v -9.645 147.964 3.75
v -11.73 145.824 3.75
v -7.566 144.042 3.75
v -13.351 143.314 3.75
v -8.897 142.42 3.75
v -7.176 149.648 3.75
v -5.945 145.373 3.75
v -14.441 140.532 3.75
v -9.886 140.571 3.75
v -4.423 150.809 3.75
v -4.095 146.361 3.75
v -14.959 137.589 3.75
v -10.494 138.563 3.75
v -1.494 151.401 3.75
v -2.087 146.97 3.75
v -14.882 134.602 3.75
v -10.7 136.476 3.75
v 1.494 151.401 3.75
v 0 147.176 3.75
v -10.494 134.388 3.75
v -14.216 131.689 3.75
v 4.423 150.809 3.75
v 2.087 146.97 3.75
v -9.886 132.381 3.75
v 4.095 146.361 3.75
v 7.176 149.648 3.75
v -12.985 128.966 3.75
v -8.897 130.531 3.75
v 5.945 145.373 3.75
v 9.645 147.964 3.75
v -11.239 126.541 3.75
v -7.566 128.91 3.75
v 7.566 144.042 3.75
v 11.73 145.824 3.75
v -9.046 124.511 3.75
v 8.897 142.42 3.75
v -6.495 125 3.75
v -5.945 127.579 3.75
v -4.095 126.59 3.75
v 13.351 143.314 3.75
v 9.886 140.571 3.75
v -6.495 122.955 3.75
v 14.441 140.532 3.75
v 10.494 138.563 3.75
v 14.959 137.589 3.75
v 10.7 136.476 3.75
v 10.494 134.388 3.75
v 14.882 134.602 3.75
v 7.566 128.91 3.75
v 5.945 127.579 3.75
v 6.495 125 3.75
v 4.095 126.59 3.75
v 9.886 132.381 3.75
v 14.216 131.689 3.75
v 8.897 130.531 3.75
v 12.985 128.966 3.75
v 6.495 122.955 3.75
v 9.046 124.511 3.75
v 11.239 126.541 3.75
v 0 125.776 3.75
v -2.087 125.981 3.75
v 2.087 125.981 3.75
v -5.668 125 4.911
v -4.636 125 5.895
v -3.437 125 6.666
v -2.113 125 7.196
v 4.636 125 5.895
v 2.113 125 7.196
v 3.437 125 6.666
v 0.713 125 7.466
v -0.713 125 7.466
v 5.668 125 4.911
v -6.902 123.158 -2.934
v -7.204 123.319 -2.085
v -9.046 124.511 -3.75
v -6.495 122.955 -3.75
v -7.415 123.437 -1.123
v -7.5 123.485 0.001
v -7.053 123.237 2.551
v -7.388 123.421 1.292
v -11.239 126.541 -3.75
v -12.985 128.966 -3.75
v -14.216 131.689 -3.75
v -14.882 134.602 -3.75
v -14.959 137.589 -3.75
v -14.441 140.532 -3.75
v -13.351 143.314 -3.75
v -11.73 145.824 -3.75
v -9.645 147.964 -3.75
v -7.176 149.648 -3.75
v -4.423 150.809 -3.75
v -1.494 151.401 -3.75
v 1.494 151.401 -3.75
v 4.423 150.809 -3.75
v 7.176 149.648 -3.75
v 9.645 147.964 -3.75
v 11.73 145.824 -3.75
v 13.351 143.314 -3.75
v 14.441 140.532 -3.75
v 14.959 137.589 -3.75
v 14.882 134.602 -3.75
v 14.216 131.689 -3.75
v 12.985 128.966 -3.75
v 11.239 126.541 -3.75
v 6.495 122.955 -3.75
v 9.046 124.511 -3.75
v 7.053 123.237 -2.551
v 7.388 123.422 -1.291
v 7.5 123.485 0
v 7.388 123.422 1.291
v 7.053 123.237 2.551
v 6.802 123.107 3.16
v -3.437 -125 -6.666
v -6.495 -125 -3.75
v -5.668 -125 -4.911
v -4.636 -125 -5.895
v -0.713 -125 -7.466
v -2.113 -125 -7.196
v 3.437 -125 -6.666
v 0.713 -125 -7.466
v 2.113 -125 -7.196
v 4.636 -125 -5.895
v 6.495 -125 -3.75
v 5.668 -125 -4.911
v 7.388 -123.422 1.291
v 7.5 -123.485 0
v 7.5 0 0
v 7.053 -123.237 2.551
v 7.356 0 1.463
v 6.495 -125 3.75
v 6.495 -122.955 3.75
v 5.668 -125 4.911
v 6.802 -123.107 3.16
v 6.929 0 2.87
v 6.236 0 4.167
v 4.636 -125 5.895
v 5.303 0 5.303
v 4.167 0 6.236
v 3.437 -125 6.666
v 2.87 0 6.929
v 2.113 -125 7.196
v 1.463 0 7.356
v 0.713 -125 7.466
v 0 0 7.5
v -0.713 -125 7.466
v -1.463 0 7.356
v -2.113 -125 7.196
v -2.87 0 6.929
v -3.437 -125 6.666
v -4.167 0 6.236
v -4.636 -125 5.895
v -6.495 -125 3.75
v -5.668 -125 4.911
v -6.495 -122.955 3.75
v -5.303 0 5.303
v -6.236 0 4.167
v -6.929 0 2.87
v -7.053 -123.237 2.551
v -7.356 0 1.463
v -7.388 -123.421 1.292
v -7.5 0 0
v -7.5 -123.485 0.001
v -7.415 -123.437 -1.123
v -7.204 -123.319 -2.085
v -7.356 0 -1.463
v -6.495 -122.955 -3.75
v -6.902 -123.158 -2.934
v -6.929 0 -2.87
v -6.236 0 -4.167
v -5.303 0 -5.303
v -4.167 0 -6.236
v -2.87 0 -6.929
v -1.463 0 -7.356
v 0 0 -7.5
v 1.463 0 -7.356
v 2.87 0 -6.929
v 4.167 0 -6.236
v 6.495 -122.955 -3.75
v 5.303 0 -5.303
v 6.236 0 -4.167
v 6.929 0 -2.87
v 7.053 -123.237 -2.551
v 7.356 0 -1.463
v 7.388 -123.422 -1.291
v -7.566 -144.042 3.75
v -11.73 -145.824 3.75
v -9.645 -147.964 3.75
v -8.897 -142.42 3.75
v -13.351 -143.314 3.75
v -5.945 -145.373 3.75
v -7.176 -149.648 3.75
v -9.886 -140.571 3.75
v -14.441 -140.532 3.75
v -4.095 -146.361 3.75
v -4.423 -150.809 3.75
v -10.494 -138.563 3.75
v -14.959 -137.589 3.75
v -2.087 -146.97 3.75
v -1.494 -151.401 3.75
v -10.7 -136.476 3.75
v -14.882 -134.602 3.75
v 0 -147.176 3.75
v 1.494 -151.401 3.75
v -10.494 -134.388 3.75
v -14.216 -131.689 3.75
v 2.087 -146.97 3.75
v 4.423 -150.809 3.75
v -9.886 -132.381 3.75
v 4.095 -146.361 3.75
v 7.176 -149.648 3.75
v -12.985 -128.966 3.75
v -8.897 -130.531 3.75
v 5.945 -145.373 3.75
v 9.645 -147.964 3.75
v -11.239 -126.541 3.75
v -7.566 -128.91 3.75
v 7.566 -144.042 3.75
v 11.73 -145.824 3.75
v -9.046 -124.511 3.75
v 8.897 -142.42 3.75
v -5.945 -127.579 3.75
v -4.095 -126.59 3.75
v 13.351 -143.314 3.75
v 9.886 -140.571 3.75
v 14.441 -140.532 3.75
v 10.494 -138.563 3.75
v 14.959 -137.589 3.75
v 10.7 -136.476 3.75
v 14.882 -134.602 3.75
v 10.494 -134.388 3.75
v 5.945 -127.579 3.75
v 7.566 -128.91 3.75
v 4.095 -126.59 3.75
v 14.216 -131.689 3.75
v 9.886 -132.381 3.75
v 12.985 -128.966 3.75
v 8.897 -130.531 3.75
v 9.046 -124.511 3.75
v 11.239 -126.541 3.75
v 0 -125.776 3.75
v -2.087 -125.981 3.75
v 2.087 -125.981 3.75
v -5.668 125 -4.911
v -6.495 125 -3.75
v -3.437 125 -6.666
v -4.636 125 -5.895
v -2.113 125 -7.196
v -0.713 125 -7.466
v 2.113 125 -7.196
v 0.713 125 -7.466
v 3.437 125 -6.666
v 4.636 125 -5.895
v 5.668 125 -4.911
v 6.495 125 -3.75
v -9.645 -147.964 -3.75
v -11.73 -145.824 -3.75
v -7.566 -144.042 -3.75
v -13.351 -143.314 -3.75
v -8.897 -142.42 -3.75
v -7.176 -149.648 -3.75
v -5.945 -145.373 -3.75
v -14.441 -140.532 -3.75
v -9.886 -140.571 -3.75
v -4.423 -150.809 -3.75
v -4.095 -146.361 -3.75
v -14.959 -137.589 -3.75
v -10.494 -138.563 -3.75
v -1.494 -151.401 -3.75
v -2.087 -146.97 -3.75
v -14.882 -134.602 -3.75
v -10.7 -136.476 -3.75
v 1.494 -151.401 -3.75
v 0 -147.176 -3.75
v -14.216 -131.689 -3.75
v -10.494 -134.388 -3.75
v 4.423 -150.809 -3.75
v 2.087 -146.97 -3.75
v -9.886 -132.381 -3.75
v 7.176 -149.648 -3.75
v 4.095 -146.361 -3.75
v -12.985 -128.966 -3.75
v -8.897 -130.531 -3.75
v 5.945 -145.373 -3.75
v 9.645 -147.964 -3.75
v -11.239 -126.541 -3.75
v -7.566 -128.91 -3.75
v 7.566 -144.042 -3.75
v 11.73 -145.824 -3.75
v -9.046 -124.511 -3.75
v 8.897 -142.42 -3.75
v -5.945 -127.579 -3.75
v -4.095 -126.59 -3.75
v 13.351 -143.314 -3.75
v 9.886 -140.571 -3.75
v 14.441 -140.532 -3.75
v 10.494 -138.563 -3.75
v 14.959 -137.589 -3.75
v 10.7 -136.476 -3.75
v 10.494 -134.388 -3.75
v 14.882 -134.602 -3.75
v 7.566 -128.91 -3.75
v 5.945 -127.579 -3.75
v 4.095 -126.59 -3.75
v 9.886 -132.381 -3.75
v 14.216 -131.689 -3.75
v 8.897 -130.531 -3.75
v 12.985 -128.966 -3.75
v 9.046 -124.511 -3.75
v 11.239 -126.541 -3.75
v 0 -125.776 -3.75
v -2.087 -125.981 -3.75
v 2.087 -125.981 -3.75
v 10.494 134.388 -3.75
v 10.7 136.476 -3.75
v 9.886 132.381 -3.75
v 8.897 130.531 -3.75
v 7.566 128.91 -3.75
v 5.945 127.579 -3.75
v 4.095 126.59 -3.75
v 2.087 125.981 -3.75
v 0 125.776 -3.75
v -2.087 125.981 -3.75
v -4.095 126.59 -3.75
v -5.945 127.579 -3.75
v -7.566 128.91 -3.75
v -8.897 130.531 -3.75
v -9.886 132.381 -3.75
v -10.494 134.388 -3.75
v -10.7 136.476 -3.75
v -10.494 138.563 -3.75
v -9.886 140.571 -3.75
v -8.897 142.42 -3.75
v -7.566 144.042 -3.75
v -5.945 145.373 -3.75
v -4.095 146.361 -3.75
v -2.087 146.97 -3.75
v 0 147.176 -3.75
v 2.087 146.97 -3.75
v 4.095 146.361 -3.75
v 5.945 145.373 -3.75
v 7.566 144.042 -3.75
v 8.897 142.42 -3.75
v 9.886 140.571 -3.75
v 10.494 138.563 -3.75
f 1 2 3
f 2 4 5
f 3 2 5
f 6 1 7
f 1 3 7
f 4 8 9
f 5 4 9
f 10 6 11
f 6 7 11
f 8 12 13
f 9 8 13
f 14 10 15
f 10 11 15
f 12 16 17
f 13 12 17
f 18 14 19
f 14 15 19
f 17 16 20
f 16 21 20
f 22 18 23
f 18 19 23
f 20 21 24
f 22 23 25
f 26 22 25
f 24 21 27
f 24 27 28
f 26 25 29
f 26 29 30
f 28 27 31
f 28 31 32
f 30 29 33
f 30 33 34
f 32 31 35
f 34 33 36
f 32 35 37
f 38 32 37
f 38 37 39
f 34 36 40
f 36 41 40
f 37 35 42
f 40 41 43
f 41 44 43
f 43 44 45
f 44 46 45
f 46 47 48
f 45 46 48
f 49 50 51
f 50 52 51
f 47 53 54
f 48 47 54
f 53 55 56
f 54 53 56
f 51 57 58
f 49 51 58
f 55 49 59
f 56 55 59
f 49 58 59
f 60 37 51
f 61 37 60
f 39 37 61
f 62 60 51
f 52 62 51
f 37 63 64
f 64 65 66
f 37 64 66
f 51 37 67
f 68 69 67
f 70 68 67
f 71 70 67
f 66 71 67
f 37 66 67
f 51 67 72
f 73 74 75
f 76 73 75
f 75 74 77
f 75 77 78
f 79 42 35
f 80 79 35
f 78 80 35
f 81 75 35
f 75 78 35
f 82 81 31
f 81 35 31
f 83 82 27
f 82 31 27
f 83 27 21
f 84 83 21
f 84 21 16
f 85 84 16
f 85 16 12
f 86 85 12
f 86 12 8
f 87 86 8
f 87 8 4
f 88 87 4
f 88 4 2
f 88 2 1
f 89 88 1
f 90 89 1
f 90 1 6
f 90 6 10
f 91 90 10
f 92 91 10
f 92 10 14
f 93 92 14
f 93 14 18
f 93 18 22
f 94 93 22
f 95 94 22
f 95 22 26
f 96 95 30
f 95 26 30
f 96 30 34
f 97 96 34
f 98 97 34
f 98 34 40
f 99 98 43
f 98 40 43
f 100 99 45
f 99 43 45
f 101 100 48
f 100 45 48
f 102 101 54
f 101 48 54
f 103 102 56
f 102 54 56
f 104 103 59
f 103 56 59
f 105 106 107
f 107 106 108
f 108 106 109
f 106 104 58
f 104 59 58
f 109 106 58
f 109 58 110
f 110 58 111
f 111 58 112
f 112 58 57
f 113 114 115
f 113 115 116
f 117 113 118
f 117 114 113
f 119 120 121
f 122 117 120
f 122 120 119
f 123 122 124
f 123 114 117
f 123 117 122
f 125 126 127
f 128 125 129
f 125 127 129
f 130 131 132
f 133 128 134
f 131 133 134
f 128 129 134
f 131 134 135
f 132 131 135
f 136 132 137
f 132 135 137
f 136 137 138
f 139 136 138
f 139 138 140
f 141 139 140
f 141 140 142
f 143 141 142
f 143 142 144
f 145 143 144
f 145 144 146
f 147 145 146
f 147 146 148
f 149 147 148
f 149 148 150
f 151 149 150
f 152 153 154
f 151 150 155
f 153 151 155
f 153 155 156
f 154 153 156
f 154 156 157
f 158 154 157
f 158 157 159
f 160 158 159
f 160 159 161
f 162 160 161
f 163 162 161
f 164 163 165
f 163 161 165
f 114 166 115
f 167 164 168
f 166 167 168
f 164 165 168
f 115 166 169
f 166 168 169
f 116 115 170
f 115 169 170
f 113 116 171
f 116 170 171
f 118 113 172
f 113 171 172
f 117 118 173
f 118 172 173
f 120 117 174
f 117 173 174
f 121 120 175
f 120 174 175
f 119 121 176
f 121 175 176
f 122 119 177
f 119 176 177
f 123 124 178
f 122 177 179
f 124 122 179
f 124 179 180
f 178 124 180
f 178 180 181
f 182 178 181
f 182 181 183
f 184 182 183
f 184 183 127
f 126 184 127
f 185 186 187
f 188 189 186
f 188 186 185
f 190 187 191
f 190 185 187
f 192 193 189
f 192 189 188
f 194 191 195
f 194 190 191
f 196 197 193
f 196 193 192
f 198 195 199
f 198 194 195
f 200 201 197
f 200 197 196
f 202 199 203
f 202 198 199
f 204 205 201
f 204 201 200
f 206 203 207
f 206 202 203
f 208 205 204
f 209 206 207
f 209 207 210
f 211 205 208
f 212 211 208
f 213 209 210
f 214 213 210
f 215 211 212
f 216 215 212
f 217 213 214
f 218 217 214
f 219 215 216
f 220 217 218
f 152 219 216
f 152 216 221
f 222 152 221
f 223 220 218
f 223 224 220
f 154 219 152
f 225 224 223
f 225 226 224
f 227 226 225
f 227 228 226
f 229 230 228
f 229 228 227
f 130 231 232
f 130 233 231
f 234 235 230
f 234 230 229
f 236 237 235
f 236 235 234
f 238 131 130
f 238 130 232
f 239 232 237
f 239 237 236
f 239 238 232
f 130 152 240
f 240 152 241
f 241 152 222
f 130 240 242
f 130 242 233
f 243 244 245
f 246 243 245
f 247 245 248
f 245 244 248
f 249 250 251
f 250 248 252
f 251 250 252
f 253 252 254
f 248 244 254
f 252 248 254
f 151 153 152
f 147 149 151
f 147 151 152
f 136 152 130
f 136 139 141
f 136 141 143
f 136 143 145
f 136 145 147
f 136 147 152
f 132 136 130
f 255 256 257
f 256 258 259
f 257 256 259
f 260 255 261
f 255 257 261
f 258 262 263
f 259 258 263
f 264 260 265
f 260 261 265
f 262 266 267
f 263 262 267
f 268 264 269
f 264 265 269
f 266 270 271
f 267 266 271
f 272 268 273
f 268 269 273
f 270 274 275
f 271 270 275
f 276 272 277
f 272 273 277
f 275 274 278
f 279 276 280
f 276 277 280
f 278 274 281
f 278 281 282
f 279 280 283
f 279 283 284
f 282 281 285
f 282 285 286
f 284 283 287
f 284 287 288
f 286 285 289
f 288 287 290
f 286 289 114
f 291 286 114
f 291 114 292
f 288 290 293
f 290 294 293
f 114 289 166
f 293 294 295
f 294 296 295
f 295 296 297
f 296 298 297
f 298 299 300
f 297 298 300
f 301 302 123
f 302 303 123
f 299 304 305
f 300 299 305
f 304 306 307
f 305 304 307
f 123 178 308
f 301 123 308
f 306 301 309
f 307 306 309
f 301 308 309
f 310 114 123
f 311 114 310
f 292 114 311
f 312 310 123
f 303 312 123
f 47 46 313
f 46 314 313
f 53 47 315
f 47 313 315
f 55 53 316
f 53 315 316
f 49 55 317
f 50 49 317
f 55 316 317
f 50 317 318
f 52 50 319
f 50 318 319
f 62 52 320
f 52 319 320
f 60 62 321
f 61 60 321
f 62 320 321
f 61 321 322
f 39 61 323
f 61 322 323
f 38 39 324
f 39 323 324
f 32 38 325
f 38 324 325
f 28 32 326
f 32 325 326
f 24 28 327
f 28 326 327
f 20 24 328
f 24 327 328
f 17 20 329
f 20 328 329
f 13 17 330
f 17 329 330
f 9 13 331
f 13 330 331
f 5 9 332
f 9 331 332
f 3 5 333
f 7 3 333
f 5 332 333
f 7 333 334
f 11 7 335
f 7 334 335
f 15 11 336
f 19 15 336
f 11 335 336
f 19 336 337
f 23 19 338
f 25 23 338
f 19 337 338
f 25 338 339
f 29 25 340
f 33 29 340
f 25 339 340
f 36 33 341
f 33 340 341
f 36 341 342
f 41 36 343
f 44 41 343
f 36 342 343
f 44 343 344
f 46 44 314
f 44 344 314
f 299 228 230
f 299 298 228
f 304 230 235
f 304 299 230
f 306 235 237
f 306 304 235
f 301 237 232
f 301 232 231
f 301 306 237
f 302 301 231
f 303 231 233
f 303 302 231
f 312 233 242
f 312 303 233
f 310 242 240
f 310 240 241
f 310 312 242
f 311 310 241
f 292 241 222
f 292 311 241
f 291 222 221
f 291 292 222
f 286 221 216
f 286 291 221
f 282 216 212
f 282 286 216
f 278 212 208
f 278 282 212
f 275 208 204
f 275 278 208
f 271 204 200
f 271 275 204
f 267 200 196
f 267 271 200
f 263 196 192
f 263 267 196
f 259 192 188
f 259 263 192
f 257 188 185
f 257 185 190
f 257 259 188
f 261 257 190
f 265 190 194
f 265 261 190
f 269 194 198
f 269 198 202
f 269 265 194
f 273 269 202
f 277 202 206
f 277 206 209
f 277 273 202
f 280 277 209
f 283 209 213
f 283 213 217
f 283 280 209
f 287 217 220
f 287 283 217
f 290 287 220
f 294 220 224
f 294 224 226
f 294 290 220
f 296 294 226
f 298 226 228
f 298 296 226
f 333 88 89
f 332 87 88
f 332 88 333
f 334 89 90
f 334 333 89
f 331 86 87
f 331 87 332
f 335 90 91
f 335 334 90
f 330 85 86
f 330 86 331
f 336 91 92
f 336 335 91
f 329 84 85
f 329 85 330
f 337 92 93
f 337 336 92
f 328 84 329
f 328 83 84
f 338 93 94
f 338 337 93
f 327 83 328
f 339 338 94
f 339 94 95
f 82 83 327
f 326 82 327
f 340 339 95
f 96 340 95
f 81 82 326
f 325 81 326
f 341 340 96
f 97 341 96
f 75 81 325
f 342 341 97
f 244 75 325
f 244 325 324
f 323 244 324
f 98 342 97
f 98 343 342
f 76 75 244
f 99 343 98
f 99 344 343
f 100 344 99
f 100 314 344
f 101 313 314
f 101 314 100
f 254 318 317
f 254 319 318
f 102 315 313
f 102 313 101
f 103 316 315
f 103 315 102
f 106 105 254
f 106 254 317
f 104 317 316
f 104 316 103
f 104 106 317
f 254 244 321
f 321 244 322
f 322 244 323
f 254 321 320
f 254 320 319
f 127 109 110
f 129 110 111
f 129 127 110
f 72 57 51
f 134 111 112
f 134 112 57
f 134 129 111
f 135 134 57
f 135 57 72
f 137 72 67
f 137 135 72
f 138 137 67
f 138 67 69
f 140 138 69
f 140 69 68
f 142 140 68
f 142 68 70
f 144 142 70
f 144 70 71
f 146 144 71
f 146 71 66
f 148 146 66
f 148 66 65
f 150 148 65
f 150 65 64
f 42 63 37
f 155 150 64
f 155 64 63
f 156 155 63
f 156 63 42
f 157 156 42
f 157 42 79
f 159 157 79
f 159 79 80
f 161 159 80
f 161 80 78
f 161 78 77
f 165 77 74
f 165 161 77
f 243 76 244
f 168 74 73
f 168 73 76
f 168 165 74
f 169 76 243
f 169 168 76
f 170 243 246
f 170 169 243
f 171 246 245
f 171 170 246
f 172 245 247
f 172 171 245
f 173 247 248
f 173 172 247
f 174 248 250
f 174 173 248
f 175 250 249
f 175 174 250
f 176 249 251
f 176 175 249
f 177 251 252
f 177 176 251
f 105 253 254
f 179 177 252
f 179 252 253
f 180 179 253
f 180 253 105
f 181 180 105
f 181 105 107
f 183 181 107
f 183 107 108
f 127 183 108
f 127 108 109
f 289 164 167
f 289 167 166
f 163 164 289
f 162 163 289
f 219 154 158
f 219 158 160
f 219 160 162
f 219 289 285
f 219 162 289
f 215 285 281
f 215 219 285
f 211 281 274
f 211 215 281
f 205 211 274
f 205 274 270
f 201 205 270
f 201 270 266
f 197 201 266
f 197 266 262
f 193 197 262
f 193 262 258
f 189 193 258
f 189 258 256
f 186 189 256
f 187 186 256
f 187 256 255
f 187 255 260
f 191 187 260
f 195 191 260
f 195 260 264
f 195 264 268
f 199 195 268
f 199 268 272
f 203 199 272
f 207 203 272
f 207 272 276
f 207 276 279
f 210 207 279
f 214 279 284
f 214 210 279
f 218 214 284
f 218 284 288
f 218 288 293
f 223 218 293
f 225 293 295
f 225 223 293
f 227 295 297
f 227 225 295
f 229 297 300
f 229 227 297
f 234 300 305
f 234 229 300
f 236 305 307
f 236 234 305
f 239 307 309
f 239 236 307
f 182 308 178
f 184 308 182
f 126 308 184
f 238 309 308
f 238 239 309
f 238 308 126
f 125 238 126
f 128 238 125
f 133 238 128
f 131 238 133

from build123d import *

# Parameters (mm, degrees)
F0_R     = 7.5
F1_DEPTH = 125
F2_R     = 15
F2_R_2   = 10.7
F3_DEPTH = 3.75


with BuildPart() as f1:
    # F0 (on Front) → F1 (new body)
    with BuildSketch(Plane.XZ):
        Circle(F0_R)
    extrude(amount=F1_DEPTH)

    # F2 (on Top) → F3 (join, symmetric)
    with BuildSketch(Plane.XY):
        with Locations((0, -136.475876)):
            Circle(F2_R)
        with Locations((0, -136.475876)):
            Circle(F2_R_2, mode=Mode.SUBTRACT)
    extrude(amount=F3_DEPTH, both=True)

    # F4: F1 across plane


with BuildPart() as f1_1:
    add(f1.part)
    add(f1.part.mirror(Plane.XZ))


solid = f1_1.part
